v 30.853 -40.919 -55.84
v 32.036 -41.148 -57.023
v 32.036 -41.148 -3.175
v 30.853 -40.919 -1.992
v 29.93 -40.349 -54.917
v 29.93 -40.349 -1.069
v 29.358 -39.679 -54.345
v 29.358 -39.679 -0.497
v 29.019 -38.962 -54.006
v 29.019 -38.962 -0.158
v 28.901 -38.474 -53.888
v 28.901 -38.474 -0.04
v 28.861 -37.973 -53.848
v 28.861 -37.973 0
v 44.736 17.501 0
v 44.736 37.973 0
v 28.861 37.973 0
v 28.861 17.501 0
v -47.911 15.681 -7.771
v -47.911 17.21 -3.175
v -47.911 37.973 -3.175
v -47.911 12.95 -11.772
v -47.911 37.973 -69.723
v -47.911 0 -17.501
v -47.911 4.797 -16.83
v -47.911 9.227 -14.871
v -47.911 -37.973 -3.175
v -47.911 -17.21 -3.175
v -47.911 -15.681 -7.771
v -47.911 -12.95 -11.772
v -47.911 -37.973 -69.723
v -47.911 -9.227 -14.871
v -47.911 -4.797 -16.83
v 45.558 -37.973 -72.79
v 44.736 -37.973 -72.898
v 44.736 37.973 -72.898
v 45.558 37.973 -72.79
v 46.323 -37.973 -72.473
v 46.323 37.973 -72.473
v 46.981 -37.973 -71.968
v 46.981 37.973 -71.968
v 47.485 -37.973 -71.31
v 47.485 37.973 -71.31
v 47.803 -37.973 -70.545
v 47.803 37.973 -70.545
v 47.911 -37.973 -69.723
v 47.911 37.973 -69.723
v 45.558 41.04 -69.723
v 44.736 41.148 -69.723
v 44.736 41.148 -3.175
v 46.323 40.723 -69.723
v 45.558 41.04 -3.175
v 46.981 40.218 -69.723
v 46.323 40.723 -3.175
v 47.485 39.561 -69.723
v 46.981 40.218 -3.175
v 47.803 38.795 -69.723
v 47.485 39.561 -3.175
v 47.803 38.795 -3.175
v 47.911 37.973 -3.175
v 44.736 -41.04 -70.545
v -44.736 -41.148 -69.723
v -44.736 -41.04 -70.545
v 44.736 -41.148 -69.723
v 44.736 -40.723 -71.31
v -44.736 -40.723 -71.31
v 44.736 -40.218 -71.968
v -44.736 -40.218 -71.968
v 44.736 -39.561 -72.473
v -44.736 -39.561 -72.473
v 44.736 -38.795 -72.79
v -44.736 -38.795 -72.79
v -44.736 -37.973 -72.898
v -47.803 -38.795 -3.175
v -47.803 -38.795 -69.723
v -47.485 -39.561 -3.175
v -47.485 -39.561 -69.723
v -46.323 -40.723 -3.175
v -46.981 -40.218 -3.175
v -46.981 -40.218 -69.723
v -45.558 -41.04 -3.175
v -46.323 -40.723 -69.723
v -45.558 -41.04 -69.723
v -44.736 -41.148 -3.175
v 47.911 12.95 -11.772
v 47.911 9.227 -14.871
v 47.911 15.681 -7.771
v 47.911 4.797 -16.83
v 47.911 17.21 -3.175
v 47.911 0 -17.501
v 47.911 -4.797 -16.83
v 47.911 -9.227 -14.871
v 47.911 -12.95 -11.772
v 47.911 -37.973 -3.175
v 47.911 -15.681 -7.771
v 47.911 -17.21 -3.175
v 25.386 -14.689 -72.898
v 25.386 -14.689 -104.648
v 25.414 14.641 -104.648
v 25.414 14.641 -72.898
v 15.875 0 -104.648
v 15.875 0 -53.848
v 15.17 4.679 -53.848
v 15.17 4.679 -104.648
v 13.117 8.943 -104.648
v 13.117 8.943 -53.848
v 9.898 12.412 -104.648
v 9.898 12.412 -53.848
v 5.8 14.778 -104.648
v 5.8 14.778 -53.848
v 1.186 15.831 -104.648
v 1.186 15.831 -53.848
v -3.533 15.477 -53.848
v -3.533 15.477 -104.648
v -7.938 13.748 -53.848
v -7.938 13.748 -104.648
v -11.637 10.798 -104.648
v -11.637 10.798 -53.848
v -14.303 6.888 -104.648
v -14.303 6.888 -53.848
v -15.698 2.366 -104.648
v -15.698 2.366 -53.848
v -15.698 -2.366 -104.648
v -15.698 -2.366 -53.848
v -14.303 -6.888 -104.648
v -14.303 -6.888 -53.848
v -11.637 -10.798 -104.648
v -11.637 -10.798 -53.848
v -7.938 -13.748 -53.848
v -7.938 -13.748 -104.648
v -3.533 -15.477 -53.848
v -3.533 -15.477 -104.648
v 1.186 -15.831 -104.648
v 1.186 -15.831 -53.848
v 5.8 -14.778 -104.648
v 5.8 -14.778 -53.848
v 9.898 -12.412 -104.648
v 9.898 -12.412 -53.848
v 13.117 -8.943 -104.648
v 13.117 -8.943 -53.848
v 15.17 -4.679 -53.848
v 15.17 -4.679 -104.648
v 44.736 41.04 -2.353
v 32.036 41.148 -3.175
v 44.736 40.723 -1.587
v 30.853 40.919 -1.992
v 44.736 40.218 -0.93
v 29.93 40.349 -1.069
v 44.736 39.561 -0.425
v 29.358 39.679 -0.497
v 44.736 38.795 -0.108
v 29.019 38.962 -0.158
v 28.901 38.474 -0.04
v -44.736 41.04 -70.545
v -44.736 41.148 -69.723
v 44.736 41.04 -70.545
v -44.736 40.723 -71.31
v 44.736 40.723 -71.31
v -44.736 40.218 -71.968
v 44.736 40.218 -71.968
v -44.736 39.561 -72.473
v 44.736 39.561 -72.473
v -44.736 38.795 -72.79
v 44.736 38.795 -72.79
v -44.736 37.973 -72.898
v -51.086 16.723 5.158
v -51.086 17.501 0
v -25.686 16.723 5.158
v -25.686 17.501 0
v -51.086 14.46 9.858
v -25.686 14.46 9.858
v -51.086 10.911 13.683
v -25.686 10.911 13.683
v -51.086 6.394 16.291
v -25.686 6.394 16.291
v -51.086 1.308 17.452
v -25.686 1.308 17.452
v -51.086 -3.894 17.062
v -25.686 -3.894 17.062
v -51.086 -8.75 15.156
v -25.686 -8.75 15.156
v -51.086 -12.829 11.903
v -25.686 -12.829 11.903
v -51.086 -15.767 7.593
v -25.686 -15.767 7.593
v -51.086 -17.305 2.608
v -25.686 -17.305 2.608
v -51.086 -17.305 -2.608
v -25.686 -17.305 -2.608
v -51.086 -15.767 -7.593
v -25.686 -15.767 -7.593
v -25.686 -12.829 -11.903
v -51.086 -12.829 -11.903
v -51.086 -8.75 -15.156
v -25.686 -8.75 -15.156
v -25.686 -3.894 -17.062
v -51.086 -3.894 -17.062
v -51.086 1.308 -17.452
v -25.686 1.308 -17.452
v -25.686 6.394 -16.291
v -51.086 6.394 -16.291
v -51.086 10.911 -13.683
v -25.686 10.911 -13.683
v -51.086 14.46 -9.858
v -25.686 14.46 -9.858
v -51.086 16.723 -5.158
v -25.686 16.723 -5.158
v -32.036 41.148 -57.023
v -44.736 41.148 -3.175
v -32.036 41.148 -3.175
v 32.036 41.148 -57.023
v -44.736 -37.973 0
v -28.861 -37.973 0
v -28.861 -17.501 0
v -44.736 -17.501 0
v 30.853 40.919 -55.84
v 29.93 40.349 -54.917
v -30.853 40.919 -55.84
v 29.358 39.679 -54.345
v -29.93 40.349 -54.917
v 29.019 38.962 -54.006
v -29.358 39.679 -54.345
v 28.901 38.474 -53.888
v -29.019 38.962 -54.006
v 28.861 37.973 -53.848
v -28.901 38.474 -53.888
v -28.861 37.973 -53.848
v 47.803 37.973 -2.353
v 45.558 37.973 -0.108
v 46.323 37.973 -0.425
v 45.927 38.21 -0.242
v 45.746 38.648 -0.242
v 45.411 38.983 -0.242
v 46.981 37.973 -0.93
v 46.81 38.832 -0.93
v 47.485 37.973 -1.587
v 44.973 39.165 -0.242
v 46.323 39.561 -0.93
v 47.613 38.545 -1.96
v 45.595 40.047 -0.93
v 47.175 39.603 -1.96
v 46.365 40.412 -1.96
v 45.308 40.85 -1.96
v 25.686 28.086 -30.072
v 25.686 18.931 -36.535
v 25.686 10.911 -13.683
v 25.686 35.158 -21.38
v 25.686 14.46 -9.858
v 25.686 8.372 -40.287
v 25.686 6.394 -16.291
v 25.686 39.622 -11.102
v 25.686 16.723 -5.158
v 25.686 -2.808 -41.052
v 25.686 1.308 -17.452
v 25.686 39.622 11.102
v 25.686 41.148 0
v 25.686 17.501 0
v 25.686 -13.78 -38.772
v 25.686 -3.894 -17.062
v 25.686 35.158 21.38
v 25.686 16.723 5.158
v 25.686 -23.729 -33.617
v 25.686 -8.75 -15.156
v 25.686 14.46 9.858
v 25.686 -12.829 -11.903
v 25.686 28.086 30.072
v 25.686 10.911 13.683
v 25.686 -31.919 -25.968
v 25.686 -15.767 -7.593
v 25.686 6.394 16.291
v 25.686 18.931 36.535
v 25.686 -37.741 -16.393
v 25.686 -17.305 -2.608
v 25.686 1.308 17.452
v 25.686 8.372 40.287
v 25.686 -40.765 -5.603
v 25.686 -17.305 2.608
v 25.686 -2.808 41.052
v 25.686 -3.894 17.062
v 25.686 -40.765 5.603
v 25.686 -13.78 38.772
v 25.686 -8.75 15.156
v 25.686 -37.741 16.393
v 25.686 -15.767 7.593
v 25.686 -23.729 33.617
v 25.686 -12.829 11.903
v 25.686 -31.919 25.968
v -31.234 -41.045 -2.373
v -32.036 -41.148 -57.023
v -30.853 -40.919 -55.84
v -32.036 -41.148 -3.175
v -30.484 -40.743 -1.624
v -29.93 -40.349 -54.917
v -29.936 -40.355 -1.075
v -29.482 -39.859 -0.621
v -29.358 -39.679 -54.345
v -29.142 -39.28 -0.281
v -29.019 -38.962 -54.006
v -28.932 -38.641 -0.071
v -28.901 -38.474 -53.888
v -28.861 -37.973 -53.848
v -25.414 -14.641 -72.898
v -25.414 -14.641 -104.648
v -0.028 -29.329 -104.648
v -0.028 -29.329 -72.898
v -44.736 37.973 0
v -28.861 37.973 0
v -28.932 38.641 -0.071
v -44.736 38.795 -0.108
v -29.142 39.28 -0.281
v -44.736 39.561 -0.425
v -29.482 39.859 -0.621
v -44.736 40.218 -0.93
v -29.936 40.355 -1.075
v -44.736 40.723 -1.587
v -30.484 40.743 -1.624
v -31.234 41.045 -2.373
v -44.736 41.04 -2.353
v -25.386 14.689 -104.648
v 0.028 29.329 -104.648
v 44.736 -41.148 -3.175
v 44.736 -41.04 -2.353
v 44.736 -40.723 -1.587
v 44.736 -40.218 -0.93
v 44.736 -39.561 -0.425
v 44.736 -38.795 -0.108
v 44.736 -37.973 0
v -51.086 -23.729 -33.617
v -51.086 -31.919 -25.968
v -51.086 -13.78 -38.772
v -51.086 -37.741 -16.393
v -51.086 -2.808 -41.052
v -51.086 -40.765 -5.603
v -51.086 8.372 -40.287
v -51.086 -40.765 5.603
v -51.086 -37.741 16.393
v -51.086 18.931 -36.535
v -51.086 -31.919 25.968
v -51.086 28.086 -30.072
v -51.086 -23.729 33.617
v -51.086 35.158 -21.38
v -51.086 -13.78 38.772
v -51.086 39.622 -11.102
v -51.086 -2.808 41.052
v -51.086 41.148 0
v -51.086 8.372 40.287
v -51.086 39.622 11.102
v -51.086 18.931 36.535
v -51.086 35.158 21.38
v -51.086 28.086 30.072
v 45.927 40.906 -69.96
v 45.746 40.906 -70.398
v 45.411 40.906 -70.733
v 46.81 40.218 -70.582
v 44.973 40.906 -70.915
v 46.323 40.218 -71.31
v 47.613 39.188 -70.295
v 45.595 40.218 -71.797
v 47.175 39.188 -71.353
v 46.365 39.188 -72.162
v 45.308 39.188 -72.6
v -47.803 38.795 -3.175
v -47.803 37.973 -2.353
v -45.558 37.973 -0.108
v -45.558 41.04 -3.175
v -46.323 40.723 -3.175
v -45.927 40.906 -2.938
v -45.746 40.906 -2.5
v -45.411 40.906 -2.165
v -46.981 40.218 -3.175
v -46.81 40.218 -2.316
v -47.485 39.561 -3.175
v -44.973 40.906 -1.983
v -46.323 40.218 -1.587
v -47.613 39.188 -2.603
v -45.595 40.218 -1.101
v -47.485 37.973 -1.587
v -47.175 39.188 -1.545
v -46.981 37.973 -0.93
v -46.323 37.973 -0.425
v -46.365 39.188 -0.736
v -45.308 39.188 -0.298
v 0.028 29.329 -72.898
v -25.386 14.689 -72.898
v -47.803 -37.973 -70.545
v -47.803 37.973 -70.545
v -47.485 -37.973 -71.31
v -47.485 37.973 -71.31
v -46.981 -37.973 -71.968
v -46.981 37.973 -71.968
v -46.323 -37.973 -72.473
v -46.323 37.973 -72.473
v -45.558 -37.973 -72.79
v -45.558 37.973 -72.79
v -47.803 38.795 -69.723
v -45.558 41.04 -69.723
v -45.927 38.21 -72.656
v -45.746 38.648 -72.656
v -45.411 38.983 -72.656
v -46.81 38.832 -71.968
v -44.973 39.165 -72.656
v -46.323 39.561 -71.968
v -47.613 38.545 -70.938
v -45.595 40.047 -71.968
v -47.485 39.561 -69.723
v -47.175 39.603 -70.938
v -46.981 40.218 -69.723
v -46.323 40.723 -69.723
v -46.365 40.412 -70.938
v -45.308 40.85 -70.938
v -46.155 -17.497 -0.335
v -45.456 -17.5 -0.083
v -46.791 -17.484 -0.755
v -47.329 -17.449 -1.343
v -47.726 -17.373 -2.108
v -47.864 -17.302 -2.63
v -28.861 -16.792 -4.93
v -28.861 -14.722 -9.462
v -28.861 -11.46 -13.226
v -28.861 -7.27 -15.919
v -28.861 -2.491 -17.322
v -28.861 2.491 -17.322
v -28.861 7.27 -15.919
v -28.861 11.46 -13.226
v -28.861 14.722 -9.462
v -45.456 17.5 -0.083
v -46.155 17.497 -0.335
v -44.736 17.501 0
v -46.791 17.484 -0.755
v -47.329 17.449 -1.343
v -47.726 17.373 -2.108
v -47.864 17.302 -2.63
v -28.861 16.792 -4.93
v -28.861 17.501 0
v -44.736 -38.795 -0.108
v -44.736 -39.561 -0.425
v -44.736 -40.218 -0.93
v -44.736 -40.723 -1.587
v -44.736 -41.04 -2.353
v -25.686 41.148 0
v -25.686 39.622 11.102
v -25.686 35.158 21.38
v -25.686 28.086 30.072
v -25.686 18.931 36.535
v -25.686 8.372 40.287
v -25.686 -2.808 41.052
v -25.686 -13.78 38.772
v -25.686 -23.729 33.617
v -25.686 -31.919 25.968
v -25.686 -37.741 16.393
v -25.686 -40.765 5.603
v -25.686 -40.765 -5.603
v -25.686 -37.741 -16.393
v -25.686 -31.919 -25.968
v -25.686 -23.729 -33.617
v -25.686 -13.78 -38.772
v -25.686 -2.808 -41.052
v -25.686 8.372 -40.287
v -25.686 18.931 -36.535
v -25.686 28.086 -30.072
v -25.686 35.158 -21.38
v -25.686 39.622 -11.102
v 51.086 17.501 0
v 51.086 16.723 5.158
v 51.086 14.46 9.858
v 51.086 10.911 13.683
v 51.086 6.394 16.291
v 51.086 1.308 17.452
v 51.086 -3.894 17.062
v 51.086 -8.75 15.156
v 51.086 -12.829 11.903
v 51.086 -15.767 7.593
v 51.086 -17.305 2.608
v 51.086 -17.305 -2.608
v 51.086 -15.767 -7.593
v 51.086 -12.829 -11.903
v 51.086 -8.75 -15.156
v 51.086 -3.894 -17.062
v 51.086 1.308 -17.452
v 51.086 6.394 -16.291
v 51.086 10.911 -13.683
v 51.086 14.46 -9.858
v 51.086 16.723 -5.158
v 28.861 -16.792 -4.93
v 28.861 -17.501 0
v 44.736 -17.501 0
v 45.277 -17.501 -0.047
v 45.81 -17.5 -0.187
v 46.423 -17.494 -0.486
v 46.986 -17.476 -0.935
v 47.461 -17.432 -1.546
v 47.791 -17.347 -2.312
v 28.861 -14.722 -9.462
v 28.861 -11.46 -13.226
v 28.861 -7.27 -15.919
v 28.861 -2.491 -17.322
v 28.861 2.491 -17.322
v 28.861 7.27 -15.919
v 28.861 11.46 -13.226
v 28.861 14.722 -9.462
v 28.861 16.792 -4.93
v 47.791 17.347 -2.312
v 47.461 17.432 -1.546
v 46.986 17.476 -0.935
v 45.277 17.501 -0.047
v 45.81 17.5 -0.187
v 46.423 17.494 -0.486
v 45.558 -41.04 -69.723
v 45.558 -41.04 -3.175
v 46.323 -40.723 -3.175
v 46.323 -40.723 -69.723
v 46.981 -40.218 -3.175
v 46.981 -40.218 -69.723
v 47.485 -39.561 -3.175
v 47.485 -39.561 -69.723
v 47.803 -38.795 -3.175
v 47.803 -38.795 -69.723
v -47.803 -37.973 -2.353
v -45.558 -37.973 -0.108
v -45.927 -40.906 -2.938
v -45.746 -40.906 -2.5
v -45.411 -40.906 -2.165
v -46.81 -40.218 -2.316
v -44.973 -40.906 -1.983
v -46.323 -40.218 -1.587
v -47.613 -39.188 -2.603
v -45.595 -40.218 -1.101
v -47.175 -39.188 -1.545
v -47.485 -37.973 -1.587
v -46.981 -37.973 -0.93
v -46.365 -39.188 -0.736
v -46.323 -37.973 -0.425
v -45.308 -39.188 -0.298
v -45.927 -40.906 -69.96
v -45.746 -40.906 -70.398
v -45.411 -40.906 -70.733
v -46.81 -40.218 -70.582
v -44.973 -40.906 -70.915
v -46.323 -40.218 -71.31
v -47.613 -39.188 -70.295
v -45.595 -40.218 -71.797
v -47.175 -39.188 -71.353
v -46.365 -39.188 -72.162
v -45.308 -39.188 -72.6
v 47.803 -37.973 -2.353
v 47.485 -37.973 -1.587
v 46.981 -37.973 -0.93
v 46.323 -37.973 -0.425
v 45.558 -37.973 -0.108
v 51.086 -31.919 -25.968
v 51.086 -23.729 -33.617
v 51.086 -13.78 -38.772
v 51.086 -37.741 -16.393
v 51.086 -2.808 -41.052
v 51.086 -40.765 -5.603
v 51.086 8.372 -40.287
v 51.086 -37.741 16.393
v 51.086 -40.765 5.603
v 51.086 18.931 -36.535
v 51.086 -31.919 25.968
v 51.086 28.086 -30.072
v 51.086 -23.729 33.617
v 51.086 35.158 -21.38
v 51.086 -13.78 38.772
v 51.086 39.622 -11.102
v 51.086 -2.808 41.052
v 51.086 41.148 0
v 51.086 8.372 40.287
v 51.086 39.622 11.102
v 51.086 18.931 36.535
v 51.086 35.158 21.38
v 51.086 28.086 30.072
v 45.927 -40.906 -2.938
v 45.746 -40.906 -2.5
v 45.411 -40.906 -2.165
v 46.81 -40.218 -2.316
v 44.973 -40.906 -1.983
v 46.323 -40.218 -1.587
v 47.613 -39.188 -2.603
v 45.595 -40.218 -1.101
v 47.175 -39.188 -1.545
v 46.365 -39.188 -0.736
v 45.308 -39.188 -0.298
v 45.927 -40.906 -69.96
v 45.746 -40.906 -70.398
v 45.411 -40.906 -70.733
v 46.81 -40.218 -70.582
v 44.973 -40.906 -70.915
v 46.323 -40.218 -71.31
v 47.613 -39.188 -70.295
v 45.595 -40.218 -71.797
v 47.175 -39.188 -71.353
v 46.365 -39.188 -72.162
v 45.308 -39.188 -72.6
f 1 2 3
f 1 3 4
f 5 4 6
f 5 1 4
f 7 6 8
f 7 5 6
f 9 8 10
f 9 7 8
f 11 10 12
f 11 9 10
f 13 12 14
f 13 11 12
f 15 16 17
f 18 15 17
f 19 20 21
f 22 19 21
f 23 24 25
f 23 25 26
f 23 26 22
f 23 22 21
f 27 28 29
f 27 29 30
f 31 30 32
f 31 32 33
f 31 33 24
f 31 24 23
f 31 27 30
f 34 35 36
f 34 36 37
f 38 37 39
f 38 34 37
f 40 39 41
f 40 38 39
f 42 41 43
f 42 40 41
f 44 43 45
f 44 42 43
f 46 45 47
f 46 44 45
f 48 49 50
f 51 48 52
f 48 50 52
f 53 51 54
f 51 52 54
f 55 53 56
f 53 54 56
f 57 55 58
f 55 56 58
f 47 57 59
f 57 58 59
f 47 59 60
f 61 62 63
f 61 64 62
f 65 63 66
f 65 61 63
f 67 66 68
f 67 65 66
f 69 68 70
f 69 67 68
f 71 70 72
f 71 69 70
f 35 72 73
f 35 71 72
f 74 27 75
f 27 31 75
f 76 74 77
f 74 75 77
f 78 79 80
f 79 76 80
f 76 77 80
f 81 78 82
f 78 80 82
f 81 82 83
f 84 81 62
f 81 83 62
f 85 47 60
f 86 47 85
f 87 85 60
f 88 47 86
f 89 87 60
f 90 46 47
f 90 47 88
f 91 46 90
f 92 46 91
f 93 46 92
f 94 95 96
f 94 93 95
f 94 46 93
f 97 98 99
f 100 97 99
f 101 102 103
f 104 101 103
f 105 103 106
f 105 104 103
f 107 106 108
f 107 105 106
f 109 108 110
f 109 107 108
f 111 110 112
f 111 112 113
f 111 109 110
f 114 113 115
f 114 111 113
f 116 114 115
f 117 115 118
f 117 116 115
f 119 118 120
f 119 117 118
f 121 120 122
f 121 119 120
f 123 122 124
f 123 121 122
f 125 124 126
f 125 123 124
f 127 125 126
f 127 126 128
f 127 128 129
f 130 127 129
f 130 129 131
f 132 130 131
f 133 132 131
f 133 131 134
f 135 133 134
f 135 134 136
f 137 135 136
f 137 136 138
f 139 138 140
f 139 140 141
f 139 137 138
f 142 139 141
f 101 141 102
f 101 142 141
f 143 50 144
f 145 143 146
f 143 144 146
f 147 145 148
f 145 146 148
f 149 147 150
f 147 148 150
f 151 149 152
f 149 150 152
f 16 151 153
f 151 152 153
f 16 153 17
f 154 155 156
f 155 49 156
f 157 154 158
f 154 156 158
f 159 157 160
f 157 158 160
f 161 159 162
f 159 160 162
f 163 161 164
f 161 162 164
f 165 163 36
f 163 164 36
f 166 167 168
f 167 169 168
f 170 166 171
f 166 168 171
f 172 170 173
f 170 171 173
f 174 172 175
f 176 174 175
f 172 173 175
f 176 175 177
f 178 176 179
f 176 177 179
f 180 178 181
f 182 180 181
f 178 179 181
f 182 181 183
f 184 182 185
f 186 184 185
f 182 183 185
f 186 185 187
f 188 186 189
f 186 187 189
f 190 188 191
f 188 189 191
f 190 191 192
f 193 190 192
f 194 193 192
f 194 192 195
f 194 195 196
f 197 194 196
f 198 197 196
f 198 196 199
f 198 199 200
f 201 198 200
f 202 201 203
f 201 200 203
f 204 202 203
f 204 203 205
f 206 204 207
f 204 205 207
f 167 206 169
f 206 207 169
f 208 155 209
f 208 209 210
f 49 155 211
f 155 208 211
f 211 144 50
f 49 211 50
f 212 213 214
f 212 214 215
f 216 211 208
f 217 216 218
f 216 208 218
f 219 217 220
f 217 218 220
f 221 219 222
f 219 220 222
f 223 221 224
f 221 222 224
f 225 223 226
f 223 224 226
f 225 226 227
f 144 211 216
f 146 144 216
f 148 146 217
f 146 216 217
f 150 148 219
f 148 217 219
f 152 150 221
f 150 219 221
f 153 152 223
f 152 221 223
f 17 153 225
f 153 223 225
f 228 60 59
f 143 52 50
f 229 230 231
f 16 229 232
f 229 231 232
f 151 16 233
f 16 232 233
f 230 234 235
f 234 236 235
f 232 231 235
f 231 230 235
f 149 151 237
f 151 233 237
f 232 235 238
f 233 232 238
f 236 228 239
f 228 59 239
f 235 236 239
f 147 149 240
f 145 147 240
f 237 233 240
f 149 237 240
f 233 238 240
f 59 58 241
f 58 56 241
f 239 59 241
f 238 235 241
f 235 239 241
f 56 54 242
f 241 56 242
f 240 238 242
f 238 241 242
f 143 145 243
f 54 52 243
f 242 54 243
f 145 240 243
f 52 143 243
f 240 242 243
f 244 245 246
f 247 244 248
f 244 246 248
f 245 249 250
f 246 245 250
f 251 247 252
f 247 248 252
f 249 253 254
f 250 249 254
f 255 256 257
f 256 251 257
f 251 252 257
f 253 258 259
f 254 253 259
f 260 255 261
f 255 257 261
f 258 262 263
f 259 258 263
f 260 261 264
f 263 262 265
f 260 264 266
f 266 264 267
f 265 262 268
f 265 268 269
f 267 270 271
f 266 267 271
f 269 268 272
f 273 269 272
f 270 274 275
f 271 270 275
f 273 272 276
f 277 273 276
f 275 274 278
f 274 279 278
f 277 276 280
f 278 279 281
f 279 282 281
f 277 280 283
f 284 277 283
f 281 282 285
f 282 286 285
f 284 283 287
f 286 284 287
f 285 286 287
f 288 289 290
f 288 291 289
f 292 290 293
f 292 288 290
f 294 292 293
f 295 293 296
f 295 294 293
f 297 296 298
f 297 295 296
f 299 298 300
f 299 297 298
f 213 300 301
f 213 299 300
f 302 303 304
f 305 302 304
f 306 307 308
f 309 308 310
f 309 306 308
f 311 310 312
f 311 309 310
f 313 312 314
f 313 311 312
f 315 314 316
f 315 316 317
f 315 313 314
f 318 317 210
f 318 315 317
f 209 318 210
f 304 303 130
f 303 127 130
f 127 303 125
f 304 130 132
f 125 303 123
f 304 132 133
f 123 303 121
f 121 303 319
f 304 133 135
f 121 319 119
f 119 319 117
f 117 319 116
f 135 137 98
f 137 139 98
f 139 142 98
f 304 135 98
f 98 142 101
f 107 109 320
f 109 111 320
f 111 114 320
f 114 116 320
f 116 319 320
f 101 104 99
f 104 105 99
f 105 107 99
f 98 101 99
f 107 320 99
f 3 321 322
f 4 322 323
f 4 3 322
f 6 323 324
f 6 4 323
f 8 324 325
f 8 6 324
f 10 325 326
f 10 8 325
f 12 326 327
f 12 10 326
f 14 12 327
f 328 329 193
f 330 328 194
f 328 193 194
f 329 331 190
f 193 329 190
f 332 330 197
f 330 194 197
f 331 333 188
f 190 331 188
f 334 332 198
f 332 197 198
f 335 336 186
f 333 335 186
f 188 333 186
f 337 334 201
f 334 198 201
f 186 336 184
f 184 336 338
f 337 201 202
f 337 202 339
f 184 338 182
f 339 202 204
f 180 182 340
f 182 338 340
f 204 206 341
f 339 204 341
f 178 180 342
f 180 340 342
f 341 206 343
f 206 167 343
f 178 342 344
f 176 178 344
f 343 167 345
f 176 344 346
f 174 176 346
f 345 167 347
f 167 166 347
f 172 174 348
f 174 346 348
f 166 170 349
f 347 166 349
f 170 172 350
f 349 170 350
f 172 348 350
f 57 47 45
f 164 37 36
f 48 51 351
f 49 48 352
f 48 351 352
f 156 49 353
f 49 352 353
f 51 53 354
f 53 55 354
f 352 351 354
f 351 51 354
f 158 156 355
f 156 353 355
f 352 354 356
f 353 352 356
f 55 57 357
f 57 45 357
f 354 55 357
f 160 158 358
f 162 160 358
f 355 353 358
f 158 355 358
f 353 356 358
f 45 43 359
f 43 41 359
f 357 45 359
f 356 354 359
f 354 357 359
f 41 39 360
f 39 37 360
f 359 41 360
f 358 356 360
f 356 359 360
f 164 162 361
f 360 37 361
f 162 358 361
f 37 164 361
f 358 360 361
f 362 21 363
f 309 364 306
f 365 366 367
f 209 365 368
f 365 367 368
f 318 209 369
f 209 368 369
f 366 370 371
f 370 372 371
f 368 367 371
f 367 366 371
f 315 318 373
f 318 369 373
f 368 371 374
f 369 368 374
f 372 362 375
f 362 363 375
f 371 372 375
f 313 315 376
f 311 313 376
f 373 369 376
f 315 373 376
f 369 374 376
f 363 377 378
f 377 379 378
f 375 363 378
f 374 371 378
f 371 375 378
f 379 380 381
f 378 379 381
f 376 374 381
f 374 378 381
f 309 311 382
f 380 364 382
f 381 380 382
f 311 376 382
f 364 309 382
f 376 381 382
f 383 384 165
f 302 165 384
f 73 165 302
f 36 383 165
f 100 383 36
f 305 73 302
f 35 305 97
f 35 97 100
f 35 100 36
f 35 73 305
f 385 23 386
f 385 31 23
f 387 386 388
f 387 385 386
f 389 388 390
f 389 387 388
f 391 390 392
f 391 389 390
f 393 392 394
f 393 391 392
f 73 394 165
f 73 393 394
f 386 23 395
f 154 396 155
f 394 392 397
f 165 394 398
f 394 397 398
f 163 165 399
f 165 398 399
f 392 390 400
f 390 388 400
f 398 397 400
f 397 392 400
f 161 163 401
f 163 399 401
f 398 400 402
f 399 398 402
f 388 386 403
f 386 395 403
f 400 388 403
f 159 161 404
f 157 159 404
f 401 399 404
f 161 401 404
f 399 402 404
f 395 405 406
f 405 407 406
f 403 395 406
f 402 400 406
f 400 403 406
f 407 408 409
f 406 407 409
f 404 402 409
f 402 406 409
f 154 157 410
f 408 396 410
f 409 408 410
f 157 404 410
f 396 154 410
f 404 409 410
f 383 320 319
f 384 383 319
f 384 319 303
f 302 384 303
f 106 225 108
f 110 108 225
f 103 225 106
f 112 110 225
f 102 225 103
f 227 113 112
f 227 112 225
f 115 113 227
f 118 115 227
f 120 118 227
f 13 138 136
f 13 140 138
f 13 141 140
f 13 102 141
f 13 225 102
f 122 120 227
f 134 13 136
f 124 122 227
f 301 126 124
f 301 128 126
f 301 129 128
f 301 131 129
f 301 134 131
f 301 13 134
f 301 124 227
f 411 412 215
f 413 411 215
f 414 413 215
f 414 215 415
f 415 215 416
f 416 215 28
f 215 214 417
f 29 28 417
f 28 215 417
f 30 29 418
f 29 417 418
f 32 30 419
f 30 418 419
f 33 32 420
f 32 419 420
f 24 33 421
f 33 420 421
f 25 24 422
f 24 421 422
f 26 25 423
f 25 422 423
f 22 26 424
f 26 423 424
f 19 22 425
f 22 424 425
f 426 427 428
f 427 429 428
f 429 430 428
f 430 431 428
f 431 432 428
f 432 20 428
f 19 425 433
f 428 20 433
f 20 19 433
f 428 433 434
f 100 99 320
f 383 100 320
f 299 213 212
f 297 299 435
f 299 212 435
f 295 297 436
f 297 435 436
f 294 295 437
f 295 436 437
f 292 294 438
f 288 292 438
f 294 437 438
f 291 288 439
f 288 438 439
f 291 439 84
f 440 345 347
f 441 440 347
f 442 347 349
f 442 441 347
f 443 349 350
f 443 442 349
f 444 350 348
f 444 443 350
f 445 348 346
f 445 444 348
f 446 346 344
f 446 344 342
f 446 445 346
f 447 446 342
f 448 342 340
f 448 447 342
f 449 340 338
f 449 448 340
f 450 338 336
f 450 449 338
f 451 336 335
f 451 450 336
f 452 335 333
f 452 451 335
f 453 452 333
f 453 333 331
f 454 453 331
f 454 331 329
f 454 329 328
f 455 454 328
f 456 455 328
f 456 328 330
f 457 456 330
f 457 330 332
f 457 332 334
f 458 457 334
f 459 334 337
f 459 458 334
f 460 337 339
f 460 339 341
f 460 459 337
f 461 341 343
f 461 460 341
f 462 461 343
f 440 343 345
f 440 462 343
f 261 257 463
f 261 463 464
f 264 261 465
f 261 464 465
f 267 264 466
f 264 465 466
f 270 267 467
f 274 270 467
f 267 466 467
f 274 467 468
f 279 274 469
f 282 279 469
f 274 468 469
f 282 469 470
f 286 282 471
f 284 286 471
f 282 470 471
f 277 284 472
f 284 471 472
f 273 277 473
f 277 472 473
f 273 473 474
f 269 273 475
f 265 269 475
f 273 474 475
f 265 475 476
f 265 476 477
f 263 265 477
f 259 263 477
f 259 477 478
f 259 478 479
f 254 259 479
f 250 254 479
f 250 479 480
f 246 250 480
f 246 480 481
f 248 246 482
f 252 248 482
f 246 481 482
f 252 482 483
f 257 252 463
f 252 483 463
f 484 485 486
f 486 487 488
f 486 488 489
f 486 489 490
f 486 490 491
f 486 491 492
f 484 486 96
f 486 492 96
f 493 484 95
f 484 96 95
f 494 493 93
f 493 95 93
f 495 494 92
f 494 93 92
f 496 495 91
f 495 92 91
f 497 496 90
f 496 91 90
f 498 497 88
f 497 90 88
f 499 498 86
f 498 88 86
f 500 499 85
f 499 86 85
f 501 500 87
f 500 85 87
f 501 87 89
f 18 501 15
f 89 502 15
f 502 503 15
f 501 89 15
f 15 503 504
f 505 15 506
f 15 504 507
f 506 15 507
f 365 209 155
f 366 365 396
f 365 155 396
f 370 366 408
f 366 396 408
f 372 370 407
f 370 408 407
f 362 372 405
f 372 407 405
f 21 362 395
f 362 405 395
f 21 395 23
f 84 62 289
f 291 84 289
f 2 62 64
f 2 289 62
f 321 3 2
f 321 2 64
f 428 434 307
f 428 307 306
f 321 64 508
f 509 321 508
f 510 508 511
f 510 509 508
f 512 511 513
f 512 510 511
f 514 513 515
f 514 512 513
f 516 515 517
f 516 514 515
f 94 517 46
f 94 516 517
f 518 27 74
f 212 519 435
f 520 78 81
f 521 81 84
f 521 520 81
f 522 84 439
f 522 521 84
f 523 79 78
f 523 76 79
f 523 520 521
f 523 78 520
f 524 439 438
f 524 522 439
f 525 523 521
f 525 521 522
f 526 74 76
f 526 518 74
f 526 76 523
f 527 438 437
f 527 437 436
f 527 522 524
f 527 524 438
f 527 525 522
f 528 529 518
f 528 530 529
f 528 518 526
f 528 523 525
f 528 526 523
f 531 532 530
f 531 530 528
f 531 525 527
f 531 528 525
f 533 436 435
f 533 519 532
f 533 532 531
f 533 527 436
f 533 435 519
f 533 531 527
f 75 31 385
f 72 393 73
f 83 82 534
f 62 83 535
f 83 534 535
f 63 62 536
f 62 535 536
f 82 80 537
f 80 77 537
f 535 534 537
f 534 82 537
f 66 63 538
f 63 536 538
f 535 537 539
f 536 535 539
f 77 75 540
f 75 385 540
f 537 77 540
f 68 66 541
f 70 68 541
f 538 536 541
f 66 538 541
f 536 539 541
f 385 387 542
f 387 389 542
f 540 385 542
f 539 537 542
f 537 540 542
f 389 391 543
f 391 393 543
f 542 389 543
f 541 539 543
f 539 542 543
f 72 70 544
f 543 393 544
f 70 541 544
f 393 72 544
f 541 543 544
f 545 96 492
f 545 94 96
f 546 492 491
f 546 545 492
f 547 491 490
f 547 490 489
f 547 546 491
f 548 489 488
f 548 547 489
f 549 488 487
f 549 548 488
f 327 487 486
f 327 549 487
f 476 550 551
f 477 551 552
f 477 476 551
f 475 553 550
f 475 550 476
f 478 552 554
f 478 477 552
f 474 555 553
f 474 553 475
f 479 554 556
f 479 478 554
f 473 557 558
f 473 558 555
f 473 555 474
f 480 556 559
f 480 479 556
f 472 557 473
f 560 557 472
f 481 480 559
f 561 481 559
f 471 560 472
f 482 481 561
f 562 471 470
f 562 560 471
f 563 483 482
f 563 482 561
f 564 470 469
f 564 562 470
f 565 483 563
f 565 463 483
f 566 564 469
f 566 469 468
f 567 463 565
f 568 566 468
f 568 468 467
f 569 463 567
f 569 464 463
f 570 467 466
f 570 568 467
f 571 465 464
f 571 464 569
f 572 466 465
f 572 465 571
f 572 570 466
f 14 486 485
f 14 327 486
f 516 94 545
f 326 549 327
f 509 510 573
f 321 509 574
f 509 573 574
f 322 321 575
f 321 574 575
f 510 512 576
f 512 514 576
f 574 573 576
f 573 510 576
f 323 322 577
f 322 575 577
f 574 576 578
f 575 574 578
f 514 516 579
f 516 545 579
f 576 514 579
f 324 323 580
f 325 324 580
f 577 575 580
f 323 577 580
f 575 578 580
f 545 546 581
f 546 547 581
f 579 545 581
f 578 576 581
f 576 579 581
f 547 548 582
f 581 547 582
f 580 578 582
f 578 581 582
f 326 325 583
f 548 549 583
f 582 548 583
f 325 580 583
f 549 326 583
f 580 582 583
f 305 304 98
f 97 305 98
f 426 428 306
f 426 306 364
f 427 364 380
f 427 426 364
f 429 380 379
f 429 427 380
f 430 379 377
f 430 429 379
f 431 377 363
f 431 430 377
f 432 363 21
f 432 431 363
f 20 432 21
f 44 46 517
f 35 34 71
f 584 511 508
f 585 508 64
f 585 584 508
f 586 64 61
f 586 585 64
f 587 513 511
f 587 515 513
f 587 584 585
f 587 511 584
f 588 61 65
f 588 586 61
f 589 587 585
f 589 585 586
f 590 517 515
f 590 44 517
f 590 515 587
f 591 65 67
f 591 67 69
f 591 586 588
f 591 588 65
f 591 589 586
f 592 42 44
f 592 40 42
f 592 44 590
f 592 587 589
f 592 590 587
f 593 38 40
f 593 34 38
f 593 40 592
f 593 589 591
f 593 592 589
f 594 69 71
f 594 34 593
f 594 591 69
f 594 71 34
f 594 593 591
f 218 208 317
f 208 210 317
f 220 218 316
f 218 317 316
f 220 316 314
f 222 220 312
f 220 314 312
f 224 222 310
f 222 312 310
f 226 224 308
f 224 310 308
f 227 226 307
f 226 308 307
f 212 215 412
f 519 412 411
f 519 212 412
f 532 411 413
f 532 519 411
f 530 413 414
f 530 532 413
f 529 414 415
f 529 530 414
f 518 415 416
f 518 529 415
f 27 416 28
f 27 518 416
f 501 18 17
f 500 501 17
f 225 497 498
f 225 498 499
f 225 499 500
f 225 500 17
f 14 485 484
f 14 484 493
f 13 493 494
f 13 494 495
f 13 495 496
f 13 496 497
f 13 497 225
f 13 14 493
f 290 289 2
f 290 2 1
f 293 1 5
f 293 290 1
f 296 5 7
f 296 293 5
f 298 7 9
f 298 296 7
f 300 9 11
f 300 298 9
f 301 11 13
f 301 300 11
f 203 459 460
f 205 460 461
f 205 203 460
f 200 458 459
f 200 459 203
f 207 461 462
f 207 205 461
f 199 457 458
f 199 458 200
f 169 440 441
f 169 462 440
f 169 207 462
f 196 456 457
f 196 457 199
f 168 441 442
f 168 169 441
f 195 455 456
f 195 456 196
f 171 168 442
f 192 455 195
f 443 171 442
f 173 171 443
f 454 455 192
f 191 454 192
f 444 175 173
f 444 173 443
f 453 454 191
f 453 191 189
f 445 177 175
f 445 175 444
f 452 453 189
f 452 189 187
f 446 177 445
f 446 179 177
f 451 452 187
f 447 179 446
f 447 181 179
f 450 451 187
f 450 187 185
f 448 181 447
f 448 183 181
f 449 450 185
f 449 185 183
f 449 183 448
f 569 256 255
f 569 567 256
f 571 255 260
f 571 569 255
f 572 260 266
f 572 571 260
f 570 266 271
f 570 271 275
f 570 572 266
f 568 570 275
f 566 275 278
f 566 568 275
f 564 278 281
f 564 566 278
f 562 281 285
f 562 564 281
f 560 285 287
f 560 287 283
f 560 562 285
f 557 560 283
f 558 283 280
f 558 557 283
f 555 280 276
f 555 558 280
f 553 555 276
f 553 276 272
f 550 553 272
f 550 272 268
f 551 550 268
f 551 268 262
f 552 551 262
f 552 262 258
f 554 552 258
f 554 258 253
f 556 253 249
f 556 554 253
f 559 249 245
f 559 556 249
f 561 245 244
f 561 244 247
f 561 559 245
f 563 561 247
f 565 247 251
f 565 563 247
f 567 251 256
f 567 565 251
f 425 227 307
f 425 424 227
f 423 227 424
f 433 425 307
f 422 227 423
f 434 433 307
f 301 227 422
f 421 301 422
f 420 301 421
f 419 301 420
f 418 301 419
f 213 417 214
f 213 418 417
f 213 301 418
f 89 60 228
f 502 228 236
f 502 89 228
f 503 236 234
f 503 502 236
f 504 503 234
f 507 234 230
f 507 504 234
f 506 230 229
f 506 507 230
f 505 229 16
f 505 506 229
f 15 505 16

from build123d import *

# Parameters (mm, degrees)
F0_R      = 41.148
F1_DEPTH  = 51.08575
F4_W      = 51.3715
F4_H      = 101.6
F5_DEPTH  = 63.5
F7_DEPTH  = 41.148
F8_DEPTH  = 31.75
F9_R      = 3.175
F10_R     = 17.5006
F11_DEPTH = 63.5
F12_R     = 15.875
F13_DEPTH = 50.8


with BuildPart() as f1:
    # F0 (on Right) → F1 (new body, symmetric)
    with BuildSketch(Plane.YZ):
        Circle(F0_R)
    extrude(amount=F1_DEPTH, both=True)

    # F4 (on Front) → F5 (cut, symmetric)
    with BuildSketch(Plane.XZ):
        Rectangle(F4_W, F4_H)
    extrude(amount=F5_DEPTH, both=True, mode=Mode.SUBTRACT)


with BuildPart() as f7:
    # F6 (on Front) → F7 (new body, symmetric)
    with BuildSketch(Plane.XZ):
        Polygon((-28.86075, 0), (-47.91075, 0), (-47.91075, -72.898), (0, -72.898), (0, -53.848), (-28.86075, -53.848), align=None)
        Polygon((0, -53.848), (0, -72.898), (47.91075, -72.898), (47.91075, 0), (28.86075, 0), (28.86075, -53.848), align=None)
    extrude(amount=F7_DEPTH, both=True)

    # F3 (on offset) → F8 (join, through all)
    with BuildSketch(Plane.XY.offset(-104.648)):
        Polygon((-25.4139085214, -14.6405801456), (-0.0278399285, -29.3293804618), (25.3860685929, -14.6888003162), (25.4139085214, 14.6405801456), (0.0278399285, 29.3293804618), (-25.3860685929, 14.6888003162), align=None)
    extrude(amount=F8_DEPTH)

    # F9
    f9_edges = [f7.edges().sort_by_distance(p)[0] for p in [
        (47.91075, 0, -72.898),
        (47.91075, 41.148, -36.449),
        (47.91075, 0, 0),
        (47.91075, -41.148, -36.449),
        (-47.91075, 0, 0),
        (-47.91075, 41.148, -36.449),
        (-47.91075, 0, -72.898),
        (-47.91075, -41.148, -36.449),
        (-38.38575, -41.148, 0),
        (0, -41.148, -72.898),
        (38.38575, -41.148, 0),
        (28.86075, -41.148, -26.924),
        (0, -41.148, -53.848),
        (-28.86075, -41.148, -26.924),
        (-38.38575, 41.148, 0),
        (0, 41.148, -72.898),
        (38.38575, 41.148, 0),
        (28.86075, 41.148, -26.924),
        (0, 41.148, -53.848),
        (-28.86075, 41.148, -26.924),
    ]]
    fillet(f9_edges, radius=F9_R)


with BuildPart() as f11_tool:
    # F10 (on Right) → F11 (new body, symmetric)
    with BuildSketch(Plane.YZ):
        Circle(F10_R)
    extrude(amount=F11_DEPTH, both=True)


with BuildPart() as f1_1:
    add(f1.part)

    # F11: cut by f11_tool
    add(f11_tool.part, mode=Mode.SUBTRACT)


with BuildPart() as f7_1:
    add(f7.part)

    # F11: cut by f11_tool
    add(f11_tool.part, mode=Mode.SUBTRACT)

    # F12 (on offset) → F13 (cut, through all)
    with BuildSketch(Plane.XY.offset(-104.648)):
        Circle(F12_R)
    extrude(amount=F13_DEPTH, mode=Mode.SUBTRACT)


solid = Compound([f1_1.part, f7_1.part])
